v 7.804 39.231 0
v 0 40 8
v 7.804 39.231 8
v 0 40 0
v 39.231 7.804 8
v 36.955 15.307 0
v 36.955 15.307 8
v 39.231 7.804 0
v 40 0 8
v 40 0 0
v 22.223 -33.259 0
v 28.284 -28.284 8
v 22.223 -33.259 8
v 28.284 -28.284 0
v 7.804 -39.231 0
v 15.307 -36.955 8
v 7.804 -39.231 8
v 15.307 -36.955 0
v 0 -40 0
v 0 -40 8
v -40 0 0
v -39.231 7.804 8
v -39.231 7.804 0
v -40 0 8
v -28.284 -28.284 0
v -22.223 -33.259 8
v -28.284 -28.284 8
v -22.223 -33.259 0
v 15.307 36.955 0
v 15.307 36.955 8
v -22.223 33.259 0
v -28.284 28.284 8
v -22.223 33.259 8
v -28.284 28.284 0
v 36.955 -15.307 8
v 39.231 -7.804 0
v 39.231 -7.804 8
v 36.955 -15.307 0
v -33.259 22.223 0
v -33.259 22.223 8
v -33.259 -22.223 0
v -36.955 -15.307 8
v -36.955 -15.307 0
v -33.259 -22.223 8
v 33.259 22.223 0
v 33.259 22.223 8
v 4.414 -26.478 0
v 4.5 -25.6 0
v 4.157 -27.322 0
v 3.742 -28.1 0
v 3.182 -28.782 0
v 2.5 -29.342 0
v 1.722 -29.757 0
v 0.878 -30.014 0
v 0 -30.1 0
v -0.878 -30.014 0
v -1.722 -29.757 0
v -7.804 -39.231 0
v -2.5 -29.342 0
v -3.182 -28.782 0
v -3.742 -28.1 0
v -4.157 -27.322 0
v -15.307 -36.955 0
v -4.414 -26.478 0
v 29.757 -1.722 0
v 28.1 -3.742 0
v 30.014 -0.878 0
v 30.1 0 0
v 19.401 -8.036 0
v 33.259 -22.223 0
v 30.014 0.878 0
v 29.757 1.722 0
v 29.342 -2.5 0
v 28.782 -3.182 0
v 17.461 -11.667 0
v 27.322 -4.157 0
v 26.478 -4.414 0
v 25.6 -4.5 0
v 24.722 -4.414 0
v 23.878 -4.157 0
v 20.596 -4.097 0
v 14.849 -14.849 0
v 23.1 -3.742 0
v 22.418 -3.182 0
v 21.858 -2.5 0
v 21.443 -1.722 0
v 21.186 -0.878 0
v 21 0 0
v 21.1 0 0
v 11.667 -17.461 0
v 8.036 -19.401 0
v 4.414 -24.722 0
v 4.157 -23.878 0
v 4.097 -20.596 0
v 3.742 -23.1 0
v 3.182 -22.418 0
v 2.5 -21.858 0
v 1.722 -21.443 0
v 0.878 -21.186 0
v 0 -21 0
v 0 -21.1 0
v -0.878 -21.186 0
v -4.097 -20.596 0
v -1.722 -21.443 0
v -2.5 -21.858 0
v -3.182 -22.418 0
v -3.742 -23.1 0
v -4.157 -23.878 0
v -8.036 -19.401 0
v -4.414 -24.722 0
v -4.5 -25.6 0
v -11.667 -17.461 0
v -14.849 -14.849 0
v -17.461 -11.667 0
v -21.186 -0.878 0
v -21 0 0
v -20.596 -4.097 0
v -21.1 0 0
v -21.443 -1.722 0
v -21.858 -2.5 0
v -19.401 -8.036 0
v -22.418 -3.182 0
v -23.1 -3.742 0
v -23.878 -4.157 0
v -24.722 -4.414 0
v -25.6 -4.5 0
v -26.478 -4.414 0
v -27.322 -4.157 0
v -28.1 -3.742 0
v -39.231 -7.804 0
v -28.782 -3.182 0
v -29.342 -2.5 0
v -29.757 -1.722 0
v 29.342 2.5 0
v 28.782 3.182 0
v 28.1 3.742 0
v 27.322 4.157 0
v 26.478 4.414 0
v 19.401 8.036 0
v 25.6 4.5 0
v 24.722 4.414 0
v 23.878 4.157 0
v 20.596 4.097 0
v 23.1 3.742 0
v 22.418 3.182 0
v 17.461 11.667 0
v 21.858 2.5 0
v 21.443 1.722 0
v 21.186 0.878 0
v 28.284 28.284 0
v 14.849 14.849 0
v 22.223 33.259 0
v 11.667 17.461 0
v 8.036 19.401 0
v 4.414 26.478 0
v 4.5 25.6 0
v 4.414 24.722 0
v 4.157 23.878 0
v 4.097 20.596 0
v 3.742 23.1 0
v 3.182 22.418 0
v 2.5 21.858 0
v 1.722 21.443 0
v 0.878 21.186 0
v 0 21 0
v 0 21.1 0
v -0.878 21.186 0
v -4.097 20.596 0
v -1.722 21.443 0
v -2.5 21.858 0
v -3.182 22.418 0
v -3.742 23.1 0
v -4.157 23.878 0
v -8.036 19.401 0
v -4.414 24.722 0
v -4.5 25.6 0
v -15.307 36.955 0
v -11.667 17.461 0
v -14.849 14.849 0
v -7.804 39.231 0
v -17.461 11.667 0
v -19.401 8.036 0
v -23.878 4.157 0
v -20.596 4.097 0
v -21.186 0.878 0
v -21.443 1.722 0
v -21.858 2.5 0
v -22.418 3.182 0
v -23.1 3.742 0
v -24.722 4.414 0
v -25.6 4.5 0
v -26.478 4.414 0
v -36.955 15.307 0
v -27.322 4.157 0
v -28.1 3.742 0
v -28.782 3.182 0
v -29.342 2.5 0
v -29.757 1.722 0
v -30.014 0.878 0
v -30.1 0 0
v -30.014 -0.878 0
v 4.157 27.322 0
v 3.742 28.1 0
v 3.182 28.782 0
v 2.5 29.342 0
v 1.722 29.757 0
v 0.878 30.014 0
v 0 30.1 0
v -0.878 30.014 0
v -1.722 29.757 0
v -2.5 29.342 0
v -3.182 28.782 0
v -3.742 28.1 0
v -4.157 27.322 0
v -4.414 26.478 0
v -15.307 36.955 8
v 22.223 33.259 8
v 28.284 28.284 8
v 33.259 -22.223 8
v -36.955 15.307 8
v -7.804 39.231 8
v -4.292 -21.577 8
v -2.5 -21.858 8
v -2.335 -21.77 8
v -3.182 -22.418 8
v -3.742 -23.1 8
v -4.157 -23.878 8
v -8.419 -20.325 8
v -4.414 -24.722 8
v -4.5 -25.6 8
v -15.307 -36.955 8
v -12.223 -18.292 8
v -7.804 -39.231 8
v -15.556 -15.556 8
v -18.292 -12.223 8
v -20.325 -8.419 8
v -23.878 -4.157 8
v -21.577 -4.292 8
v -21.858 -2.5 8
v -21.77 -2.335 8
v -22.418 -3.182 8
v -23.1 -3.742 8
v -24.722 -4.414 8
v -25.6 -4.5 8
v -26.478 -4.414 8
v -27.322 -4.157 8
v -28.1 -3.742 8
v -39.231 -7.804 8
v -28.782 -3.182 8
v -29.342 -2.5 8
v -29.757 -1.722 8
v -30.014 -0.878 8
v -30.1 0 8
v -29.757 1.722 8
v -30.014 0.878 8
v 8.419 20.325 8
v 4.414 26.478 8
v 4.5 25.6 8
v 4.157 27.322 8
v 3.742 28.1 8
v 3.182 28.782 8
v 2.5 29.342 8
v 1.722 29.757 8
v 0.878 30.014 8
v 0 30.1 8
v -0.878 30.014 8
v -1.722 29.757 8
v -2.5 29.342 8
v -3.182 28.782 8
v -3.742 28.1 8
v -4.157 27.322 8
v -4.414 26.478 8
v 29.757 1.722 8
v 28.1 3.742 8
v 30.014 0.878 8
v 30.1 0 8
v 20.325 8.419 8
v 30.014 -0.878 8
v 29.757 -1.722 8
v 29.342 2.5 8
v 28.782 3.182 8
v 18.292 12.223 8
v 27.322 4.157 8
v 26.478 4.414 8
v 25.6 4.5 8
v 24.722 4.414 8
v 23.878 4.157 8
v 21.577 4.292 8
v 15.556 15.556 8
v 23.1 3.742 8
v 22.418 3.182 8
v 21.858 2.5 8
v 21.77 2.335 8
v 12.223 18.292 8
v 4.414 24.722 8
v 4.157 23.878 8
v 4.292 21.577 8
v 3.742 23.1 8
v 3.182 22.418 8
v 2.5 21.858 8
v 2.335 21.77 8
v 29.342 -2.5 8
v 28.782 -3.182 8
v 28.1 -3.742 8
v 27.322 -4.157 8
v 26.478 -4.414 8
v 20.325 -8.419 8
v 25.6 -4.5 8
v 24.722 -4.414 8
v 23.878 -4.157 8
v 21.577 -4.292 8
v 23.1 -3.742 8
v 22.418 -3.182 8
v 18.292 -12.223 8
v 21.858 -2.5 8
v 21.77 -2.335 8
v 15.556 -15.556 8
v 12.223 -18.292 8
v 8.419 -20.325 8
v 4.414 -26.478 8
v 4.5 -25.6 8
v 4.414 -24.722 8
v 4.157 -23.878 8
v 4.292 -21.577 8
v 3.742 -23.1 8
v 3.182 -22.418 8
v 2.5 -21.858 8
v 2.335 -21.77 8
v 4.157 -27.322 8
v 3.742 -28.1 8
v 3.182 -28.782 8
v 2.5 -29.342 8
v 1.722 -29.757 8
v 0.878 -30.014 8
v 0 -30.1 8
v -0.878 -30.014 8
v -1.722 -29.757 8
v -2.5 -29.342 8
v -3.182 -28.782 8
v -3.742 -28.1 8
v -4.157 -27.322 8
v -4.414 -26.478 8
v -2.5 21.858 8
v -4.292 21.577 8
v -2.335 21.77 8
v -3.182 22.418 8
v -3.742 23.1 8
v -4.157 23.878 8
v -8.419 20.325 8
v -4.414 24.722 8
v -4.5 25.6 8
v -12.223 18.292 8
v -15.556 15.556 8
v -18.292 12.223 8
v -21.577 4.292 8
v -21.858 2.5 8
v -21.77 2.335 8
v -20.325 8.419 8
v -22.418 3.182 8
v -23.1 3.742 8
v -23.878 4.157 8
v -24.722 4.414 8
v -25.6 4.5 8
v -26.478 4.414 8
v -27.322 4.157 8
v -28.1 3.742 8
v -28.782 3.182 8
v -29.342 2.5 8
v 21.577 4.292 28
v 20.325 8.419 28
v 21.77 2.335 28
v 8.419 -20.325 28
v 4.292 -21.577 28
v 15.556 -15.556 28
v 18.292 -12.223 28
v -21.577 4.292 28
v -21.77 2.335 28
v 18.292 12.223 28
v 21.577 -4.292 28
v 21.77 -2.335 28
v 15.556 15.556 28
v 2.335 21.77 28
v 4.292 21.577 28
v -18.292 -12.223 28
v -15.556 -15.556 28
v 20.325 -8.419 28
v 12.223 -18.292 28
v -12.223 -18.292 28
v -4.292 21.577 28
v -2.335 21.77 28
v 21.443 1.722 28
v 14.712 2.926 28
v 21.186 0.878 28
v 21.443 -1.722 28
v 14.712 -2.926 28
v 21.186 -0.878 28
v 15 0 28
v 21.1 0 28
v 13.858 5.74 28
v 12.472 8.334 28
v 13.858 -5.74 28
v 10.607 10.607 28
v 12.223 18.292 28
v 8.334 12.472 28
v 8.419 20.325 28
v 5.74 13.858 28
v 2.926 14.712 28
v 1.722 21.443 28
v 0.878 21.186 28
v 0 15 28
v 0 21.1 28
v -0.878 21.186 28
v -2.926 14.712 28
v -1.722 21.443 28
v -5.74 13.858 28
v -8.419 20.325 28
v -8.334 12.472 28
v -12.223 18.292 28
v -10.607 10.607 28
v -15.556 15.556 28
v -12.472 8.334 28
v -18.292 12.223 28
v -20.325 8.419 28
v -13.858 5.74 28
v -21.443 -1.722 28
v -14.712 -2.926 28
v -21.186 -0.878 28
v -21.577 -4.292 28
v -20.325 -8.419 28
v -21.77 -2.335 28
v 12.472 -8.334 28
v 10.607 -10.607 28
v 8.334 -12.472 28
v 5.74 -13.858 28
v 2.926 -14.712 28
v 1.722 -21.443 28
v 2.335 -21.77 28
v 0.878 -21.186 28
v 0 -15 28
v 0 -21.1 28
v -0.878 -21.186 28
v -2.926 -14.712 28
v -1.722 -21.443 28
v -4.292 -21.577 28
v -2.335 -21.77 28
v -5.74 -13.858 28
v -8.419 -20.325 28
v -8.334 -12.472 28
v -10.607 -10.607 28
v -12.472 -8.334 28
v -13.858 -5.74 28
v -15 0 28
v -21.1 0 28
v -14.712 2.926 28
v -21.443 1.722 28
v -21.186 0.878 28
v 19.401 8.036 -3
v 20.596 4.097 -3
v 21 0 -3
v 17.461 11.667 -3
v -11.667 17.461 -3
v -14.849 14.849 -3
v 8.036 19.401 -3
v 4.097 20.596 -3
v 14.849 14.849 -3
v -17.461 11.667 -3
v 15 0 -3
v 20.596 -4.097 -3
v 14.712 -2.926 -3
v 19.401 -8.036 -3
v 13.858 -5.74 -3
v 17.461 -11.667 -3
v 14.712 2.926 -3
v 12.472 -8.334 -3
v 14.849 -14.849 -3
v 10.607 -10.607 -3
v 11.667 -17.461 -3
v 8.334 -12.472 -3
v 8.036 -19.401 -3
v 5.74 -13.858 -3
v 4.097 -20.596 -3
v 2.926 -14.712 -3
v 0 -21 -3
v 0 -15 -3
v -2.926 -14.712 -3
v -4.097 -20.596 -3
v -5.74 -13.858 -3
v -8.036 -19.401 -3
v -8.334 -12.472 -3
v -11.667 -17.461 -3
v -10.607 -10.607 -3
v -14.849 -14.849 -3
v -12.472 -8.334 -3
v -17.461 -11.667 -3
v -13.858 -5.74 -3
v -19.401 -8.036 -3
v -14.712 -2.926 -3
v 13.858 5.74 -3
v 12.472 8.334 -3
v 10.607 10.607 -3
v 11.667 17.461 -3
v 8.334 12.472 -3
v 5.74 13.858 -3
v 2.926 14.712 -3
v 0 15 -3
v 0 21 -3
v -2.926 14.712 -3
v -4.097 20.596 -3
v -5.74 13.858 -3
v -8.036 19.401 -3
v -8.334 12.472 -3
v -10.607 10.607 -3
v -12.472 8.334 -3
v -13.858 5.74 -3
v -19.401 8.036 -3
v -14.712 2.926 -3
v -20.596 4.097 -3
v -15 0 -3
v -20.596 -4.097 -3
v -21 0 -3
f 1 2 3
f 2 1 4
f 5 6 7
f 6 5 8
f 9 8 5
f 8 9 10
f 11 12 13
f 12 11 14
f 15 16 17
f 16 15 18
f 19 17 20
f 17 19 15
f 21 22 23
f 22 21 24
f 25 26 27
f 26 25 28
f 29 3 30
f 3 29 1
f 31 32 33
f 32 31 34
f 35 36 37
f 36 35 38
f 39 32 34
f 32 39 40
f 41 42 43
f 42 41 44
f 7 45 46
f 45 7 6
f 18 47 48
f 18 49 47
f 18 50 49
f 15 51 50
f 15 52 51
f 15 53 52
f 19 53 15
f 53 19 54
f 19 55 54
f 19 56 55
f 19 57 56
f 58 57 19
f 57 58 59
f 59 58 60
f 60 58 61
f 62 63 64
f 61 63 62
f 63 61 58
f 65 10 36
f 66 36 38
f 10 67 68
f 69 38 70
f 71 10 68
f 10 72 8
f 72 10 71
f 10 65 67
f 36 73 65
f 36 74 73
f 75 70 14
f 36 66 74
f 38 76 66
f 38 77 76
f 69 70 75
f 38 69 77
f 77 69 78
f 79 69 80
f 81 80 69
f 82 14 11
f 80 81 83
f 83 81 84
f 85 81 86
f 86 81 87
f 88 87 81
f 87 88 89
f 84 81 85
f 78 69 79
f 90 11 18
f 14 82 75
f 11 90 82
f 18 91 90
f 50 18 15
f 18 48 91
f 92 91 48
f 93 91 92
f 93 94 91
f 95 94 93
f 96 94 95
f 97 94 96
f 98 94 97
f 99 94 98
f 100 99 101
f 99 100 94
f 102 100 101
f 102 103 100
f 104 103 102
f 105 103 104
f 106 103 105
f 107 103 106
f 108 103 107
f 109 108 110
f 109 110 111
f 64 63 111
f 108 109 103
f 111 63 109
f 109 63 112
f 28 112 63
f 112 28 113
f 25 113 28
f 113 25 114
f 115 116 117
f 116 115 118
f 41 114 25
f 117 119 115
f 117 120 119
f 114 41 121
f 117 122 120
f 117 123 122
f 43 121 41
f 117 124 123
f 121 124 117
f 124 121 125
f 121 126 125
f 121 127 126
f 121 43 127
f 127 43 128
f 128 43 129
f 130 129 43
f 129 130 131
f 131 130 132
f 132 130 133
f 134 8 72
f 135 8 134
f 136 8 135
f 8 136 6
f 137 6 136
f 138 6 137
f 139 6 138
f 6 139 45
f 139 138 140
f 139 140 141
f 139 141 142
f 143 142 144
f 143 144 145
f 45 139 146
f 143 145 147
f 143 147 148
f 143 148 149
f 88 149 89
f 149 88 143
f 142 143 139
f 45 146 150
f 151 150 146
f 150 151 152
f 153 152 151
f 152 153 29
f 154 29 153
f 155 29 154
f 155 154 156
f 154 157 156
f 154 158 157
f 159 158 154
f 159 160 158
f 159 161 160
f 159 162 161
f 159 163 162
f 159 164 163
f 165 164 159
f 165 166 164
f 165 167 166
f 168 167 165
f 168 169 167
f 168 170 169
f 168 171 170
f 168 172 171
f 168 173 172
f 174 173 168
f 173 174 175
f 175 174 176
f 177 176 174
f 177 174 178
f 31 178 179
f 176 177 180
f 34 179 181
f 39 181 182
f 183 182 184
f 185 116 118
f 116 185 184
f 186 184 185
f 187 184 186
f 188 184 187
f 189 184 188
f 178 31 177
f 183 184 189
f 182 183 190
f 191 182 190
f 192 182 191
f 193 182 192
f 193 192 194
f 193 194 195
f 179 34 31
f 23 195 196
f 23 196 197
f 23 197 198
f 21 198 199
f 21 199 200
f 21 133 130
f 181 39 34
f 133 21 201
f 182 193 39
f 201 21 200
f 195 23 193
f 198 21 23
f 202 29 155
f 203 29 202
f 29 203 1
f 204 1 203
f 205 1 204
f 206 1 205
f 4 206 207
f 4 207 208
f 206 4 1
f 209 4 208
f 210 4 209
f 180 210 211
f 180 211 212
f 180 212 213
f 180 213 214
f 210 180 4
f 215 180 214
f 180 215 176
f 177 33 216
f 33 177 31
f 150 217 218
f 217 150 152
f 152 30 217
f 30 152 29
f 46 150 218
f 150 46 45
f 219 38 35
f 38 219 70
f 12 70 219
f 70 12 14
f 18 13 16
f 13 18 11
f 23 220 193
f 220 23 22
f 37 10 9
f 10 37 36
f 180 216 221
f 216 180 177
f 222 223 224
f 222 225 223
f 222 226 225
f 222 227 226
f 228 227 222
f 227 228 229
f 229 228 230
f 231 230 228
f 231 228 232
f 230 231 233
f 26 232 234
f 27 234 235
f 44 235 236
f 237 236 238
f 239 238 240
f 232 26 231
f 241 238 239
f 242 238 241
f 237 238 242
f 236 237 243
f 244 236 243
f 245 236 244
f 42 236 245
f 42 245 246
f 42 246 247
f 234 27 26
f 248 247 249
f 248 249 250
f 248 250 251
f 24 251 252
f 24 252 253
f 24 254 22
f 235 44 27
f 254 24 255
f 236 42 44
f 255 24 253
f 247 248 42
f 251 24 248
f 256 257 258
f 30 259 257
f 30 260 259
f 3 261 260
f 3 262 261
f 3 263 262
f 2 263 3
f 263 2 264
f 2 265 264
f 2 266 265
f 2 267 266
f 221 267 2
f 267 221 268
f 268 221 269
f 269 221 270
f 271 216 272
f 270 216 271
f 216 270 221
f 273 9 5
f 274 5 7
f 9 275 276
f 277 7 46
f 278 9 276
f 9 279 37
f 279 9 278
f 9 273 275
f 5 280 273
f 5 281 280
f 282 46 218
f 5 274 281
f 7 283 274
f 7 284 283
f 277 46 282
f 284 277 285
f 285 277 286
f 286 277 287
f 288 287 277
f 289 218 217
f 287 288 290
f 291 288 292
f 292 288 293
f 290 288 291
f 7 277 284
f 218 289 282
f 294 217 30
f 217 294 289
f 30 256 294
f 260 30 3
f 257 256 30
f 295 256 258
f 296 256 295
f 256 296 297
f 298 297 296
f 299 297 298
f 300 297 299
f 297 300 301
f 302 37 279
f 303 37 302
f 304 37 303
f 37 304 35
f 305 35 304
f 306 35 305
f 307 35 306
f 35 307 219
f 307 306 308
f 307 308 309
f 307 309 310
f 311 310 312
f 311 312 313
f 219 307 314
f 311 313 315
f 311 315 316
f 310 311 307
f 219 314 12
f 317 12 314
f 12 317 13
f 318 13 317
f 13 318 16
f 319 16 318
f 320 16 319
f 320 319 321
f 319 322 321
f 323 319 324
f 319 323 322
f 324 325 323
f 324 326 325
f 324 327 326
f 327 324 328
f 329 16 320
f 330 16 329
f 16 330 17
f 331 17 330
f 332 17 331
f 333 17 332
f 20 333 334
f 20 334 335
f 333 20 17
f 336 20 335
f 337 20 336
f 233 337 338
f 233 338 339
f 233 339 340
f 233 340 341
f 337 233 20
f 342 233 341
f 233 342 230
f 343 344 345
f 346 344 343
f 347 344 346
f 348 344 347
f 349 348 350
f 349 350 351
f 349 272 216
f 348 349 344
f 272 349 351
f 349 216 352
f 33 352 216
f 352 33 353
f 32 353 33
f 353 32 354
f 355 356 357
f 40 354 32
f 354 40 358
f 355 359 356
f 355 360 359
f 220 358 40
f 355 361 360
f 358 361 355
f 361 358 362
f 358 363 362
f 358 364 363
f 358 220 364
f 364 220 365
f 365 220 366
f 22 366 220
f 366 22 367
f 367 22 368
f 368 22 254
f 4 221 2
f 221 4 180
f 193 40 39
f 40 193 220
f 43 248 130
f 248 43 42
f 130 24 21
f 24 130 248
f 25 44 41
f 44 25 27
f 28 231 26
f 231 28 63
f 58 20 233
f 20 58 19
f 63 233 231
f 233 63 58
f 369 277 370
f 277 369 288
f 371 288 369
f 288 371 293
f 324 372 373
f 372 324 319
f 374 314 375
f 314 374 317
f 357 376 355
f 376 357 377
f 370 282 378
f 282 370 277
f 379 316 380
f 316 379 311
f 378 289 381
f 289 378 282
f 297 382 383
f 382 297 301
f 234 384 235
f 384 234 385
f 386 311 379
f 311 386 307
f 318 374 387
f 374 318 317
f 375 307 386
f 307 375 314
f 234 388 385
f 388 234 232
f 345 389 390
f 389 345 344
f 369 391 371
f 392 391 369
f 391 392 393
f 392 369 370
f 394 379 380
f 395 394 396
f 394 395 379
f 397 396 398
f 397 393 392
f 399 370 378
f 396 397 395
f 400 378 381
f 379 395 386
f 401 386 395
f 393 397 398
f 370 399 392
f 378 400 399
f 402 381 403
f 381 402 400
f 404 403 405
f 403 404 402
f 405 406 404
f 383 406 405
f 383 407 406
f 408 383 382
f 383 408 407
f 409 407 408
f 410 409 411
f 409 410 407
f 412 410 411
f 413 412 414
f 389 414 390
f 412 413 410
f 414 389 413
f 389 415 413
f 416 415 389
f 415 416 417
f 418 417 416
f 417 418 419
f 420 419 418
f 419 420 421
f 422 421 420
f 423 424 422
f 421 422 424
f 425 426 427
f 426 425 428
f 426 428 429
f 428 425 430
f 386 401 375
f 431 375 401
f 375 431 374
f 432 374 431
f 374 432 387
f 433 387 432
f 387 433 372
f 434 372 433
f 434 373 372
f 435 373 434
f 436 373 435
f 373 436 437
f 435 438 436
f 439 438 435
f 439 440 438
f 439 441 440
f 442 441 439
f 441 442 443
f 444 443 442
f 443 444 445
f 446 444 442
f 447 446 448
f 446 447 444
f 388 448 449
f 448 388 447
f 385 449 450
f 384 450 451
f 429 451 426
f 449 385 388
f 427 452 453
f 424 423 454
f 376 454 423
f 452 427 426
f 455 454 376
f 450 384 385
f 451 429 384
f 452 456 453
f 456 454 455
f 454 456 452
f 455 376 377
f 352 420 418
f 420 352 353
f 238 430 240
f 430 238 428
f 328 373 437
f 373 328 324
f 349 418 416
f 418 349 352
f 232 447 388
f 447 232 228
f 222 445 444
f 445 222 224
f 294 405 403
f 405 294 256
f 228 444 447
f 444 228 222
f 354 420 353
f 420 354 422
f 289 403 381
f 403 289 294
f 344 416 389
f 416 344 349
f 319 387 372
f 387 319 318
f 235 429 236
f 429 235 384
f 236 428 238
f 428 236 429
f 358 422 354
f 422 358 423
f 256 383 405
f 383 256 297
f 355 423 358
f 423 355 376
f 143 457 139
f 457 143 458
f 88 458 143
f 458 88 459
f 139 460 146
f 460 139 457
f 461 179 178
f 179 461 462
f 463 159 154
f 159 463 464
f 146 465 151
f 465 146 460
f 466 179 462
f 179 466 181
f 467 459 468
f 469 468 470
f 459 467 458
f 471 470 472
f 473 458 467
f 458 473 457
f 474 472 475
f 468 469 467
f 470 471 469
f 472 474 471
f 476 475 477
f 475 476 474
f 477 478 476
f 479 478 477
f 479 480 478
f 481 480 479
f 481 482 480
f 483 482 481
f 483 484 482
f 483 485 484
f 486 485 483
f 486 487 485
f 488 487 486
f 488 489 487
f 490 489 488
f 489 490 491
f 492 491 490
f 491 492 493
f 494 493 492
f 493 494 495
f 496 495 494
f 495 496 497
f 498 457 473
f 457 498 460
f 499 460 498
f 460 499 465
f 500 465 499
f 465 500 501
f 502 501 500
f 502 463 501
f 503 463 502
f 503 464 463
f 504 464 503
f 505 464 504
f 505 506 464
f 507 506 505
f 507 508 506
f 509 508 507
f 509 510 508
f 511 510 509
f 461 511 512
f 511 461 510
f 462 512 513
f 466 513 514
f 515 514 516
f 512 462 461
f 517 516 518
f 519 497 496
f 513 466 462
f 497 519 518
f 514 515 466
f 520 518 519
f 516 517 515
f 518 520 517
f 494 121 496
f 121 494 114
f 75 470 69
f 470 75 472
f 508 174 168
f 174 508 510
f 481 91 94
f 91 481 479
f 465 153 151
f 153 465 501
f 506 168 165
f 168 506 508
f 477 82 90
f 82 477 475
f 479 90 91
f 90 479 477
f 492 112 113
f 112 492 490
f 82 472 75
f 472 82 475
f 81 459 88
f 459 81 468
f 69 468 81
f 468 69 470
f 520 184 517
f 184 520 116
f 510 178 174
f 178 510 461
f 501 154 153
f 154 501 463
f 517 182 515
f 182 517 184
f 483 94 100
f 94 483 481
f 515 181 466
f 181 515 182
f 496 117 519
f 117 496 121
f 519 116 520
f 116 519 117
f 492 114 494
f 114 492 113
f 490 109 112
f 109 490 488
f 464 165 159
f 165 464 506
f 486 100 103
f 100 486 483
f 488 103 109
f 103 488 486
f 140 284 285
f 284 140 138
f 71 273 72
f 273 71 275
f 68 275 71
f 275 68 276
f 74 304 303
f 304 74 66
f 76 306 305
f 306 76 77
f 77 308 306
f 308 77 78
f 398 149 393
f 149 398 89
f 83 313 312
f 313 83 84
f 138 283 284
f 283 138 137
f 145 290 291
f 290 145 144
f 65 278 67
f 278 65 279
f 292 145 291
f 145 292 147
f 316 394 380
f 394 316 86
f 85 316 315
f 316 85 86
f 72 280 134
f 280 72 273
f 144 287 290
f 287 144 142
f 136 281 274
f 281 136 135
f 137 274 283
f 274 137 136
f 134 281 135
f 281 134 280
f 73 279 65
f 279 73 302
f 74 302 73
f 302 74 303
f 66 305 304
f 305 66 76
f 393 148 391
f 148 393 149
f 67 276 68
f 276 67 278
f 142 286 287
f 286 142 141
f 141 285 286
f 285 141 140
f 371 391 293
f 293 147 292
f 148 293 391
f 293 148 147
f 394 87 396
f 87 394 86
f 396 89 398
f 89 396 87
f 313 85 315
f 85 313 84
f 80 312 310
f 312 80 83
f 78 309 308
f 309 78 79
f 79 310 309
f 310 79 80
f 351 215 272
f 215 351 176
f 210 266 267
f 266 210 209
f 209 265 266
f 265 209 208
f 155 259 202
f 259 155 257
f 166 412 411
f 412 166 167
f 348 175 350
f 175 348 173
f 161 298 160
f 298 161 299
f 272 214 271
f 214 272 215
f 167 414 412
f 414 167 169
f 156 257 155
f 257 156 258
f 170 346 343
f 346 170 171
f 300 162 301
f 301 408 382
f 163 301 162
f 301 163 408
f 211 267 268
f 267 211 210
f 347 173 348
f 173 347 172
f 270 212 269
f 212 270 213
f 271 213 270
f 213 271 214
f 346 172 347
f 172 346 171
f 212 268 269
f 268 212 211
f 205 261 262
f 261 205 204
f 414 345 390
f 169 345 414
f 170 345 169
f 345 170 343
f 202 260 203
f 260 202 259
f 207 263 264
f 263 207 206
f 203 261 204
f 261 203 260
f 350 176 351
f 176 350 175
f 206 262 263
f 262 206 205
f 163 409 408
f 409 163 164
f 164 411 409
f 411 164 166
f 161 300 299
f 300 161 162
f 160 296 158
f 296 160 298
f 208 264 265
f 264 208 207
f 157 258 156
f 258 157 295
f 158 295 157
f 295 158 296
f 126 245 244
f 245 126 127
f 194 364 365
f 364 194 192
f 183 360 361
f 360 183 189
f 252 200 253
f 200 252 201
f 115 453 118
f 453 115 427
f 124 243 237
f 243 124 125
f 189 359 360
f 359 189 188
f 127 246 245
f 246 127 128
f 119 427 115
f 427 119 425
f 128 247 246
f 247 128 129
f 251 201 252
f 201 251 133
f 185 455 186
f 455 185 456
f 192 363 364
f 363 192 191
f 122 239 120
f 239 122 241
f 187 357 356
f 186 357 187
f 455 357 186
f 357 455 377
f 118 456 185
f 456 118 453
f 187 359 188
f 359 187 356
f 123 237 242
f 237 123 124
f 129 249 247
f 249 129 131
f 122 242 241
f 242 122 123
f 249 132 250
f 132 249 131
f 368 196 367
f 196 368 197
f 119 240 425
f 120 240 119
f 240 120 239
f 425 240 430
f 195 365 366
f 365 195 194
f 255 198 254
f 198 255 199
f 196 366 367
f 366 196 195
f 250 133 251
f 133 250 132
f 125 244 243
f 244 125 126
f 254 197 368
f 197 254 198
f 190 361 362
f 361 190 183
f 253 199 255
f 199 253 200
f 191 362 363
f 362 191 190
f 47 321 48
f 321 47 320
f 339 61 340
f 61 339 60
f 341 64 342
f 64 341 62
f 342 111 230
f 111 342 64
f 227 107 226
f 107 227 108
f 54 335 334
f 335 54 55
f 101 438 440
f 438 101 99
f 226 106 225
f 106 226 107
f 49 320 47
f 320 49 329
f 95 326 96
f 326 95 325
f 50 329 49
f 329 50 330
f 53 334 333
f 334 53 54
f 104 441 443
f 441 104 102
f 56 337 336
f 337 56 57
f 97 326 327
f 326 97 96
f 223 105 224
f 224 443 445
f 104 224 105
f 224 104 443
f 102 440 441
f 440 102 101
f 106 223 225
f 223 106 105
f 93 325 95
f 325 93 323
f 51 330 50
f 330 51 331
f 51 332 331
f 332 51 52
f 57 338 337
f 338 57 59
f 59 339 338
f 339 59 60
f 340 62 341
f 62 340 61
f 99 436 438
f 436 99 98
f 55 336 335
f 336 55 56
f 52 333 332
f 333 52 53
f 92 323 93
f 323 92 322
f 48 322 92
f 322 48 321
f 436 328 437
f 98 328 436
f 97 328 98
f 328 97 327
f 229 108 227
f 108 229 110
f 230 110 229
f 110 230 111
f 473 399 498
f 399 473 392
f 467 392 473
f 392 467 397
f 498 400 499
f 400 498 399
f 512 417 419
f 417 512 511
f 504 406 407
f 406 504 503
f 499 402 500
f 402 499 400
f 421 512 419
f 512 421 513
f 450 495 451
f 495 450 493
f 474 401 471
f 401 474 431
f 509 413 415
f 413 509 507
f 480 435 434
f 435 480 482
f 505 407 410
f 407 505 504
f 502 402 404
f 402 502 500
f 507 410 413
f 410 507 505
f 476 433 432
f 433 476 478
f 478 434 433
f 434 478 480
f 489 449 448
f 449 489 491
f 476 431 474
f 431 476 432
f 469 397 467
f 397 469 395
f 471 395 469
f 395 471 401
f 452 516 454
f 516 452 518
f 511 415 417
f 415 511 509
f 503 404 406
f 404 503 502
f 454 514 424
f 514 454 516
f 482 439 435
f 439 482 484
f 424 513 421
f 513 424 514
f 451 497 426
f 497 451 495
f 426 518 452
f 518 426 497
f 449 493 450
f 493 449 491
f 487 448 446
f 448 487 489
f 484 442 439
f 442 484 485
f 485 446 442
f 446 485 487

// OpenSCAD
$fn = 32;

// ----------------------------------------------------------------------
// Bolt-circle flange: 80 mm outside, 4 bolt holes, bore 30 mm
// ----------------------------------------------------------------------

// --- parameters (mm) ---
flange_d = 80;            // flange outside diameter
flange_t = 8;             // flange thickness
bolts = 4;                // number of bolt holes
bolt_d = 9;               // bolt clearance
bolt_r = 25.6;            // bolt circle radius
bore_d = 30;              // centre bore
hub_d = 44;               // raised hub diameter
hub_h = 20;               // raised hub height
spigot_d = 42;            // spigot diameter
spigot_h = 4;             // spigot height below the flange
sink = 1;                 // overlap into the flange

module body() {
  cylinder(h = flange_t, d = flange_d);
  /* raised hub, sunk 1 mm into the flange */
  translate([0, 0, flange_t - 1]) cylinder(h = hub_h + 1, d = hub_d);
  /* spigot on the back face, sunk into the flange */
  translate([0, 0, -spigot_h + sink]) cylinder(h = spigot_h, d = spigot_d);
}

difference() {
  body();
  /* bolt circle */
  for (i = [0 : bolts - 1]) rotate([0, 0, i * 360 / bolts]) translate([bolt_r, 0, -spigot_h - 1]) cylinder(h = flange_t + hub_h + spigot_h + 3, d = bolt_d);
  translate([0, 0, -spigot_h - 1]) cylinder(h = flange_t + hub_h + spigot_h + 3, d = bore_d);
}
